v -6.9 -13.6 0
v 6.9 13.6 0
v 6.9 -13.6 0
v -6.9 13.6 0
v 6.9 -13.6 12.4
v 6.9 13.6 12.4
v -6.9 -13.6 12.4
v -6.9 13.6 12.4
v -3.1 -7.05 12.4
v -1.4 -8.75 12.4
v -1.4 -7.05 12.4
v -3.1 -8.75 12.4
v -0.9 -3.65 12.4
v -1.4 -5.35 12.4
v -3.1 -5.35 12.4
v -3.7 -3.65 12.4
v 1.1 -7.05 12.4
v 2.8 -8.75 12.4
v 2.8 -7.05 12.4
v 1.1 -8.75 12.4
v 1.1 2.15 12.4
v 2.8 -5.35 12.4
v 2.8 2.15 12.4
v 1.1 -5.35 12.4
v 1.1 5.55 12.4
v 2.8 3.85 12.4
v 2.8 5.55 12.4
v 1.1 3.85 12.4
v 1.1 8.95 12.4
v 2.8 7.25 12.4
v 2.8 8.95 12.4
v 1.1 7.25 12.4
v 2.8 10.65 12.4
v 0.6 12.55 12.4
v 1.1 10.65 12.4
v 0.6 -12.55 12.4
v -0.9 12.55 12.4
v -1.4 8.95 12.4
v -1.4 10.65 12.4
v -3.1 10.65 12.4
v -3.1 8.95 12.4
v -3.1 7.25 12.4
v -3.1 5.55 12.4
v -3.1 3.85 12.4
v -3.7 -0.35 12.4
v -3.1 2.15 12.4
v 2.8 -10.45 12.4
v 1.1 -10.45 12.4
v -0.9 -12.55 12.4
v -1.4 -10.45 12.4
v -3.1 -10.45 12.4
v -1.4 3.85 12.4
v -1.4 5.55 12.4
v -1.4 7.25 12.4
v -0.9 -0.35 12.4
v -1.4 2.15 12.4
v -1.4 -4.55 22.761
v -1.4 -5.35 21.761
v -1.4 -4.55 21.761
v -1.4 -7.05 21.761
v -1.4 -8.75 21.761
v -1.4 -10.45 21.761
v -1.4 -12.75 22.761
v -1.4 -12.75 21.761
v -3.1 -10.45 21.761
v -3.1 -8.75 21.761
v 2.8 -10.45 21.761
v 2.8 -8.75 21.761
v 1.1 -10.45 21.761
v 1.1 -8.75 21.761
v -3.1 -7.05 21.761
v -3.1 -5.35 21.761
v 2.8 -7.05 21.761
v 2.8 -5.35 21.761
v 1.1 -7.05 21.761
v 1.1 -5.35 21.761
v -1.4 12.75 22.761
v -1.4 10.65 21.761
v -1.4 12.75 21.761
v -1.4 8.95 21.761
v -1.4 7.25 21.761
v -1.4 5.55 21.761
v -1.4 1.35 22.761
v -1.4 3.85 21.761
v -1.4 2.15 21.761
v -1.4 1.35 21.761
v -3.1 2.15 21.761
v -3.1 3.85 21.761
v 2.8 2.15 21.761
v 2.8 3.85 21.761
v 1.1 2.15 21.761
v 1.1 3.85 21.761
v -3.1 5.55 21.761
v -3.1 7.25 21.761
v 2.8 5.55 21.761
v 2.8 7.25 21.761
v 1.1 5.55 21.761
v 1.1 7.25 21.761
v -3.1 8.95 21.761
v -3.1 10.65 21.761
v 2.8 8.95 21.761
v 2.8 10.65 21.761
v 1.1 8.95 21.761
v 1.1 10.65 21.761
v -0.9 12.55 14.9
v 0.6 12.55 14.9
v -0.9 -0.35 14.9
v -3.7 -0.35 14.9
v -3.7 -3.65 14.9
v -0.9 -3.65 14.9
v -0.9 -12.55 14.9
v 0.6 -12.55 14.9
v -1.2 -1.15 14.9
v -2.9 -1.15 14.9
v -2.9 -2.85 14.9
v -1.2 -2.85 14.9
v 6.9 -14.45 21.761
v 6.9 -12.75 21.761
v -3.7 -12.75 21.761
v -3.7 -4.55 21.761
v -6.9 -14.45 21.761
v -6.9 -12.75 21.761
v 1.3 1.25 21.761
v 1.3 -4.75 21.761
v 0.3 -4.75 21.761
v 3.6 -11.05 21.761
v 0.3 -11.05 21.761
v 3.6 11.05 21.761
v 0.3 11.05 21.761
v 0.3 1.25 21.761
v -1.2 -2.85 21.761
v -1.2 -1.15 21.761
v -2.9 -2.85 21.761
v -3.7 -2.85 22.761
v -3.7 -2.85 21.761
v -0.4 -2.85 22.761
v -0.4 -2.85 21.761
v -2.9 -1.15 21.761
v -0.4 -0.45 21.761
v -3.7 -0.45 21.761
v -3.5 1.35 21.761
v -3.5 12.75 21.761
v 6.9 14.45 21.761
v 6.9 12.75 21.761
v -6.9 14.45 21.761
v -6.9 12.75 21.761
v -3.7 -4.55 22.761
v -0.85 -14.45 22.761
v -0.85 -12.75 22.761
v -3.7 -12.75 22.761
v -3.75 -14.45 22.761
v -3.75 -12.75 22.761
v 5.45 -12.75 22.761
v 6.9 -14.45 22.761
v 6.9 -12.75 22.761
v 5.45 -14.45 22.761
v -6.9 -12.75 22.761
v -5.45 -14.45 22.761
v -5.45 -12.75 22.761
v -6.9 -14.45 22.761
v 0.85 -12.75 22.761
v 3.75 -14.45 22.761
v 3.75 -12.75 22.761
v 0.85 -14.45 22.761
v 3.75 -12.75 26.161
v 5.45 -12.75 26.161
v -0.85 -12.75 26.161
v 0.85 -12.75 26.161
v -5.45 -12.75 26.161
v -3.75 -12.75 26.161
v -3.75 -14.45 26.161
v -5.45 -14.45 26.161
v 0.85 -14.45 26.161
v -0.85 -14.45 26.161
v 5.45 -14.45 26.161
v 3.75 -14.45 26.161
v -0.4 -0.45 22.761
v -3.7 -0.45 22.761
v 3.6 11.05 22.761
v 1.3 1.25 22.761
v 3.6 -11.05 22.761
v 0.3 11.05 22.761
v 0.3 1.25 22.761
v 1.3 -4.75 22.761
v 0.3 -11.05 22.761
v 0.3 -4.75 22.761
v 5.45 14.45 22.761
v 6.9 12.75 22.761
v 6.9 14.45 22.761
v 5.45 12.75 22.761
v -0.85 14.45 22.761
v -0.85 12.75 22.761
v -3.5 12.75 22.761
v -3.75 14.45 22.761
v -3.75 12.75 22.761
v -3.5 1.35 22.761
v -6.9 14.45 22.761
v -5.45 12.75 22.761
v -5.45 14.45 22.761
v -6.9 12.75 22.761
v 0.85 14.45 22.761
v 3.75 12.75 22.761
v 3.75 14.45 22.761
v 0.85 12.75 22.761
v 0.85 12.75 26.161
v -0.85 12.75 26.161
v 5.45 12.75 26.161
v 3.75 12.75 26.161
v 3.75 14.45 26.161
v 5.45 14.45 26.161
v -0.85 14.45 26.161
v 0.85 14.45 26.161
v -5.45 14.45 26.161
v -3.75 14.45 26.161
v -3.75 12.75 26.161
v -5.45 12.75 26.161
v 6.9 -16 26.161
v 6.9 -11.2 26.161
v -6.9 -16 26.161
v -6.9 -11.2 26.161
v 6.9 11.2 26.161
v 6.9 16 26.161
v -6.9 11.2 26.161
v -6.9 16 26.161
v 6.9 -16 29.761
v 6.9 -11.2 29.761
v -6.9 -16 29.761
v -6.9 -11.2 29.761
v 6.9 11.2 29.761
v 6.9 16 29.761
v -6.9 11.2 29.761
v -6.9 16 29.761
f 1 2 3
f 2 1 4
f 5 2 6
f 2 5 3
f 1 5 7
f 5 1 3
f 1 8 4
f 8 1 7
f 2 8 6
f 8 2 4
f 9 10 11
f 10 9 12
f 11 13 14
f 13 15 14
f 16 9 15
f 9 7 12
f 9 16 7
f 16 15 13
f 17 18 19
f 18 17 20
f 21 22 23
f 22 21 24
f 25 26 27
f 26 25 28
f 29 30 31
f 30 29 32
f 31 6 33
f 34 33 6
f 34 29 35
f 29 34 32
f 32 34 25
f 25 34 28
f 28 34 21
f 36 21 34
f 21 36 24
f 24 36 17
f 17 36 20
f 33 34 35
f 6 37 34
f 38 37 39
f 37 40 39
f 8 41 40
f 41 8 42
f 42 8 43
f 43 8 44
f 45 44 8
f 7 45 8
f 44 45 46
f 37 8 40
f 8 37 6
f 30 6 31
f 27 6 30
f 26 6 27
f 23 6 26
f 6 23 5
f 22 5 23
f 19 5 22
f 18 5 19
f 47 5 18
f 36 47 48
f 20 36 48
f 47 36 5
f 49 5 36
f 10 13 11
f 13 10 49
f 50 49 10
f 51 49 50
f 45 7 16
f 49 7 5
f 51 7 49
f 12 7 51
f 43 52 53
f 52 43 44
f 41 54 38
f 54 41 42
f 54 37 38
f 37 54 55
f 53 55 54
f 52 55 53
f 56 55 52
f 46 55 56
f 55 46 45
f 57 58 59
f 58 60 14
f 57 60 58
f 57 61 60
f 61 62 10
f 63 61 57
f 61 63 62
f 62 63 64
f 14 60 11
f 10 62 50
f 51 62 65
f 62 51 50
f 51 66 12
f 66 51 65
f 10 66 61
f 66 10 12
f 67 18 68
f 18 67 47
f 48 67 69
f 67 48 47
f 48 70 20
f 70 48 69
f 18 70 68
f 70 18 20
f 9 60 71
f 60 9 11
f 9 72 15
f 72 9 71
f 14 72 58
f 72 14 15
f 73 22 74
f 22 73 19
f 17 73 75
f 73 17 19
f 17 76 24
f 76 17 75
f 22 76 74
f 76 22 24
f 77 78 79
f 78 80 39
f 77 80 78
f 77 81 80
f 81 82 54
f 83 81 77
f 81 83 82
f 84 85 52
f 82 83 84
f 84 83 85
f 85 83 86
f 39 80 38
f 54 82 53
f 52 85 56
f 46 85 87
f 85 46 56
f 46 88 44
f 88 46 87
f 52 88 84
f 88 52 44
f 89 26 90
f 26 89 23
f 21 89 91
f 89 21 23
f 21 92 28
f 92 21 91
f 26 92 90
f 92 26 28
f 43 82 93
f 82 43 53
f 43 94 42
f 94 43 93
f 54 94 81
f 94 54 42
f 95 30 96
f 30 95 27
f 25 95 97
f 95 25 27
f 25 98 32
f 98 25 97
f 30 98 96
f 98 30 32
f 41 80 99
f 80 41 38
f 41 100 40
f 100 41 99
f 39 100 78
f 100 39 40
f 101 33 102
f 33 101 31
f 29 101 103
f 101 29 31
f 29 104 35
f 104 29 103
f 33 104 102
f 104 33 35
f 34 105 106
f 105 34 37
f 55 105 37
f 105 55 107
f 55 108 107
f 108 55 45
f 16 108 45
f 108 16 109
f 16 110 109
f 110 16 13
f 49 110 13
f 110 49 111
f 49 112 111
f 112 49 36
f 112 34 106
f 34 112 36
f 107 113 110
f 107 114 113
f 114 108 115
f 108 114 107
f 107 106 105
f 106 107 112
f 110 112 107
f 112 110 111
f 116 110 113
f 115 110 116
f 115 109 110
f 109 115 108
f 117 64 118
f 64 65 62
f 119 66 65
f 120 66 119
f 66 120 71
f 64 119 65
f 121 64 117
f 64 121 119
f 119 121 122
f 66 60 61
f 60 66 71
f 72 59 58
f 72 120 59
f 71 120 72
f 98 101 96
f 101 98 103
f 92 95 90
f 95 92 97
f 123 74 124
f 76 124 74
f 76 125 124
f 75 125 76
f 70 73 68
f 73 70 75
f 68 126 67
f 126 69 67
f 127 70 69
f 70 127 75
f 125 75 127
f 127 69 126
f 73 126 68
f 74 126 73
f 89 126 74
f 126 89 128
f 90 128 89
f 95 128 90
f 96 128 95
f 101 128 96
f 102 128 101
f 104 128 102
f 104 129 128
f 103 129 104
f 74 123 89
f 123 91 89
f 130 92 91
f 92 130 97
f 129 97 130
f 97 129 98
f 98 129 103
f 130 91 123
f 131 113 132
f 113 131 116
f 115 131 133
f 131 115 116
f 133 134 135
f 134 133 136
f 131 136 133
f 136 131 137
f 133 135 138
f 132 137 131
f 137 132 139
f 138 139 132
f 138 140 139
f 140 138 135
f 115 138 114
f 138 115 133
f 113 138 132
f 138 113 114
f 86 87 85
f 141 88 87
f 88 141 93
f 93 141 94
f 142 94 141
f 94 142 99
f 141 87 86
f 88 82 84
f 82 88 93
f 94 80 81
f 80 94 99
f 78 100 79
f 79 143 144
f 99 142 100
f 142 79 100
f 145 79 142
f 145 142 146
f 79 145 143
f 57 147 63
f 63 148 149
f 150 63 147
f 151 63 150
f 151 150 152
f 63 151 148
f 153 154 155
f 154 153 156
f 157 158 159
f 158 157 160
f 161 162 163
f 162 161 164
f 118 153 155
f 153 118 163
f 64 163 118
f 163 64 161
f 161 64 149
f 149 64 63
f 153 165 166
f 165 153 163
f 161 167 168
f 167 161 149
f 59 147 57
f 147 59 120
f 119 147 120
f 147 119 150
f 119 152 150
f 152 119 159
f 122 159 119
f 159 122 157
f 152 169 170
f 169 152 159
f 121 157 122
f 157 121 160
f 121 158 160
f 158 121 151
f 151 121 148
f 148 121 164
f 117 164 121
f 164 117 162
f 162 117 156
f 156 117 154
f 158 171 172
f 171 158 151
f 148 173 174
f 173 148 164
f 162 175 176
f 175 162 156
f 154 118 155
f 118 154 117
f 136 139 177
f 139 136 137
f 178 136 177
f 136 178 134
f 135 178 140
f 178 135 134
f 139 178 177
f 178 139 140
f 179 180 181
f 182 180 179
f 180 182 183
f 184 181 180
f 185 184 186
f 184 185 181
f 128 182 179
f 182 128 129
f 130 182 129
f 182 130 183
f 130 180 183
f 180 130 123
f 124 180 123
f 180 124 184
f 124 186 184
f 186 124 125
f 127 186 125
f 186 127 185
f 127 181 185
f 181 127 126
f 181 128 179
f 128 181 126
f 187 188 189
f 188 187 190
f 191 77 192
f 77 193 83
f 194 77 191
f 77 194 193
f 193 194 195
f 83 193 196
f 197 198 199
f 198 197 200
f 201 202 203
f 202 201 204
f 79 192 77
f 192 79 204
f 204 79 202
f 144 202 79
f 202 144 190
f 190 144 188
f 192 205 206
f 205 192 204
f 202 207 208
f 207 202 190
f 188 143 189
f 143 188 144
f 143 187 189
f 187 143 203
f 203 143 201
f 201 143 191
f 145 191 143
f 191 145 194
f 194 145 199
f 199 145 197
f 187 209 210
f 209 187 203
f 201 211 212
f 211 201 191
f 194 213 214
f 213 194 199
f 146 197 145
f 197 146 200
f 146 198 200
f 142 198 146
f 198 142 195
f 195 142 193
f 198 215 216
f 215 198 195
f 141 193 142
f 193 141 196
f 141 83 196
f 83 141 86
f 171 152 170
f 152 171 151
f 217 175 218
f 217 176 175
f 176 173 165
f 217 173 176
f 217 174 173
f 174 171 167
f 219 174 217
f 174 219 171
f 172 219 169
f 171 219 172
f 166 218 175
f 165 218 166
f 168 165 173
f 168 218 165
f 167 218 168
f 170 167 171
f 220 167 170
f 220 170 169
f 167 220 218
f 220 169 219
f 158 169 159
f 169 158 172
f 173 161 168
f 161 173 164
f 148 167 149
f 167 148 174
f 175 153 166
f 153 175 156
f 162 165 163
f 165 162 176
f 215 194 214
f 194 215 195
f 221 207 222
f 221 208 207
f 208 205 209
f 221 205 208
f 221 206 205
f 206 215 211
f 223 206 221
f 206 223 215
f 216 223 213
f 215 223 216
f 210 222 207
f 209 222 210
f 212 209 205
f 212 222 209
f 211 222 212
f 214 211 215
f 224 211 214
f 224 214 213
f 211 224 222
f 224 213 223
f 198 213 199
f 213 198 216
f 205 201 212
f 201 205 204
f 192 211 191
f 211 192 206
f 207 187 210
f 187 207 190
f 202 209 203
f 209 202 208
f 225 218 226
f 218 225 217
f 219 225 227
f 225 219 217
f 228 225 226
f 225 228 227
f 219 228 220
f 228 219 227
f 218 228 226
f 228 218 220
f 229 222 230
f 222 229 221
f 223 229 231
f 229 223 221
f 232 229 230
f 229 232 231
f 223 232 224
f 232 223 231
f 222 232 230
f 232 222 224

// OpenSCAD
// Generated by SolidPython 0.4.2 on 2020-09-29 23:20:58
//!OpenSCAD

scale(v = 0.0100000000) {
	translate(v = [-690, -1360, 0]) {
		union() {
			color(c = [0.4000000000, 0.4000000000, 0.4000000000]) {
				translate(v = [0, 0, 0]) {
					linear_extrude(height = 1000.0000000000) {
						polygon(paths = [[0, 1, 2, 3]], points = [[0, 0], [0, 2720], [1380, 2720], [1380, 0]]);
					}
				}
			}
			color(c = [0.2000000000, 0.6000000000, 0.2000000000]) {
				translate(v = [0, 0, 1000.0000000000]) {
					linear_extrude(height = 120.0000000000) {
						polygon(paths = [[0, 1, 2, 3]], points = [[0, 1305], [0, 2720], [1380, 2720], [1380, 1305]]);
					}
				}
			}
			color(c = [0.4000000000, 0.4000000000, 0.4000000000]) {
				translate(v = [0, 0, 1000.0000000000]) {
					linear_extrude(height = 120.0000000000) {
						polygon(paths = [[0, 1, 2, 3]], points = [[0, 0], [0, 1305], [1380, 1305], [1380, 0]]);
					}
				}
			}
			color(c = [0.9000000000, 0.6000000000, 0.6000000000]) {
				translate(v = [0, 0, 1120.0000000000]) {
					linear_extrude(height = 120.0000000000) {
						polygon(paths = [[0, 1, 2, 3]], points = [[340, 1485], [340, 2485], [600, 2485], [600, 1485]]);
					}
				}
			}
			color(c = [0.9000000000, 0.6000000000, 0.6000000000]) {
				translate(v = [0, 0, 1120.0000000000]) {
					linear_extrude(height = 120.0000000000) {
						polygon(paths = [[0, 1, 2, 3]], points = [[750, 1485], [750, 2485], [1010, 2485], [1010, 1485]]);
					}
				}
			}
			color(c = [0.9000000000, 0.6000000000, 0.9000000000]) {
				translate(v = [0, 0, 1120.0000000000]) {
					linear_extrude(height = 120.0000000000) {
						polygon(paths = [[0, 1, 2, 3]], points = [[340, 235], [340, 885], [600, 885], [600, 235]]);
					}
				}
			}
			color(c = [0.9000000000, 0.6000000000, 0.9000000000]) {
				translate(v = [0, 0, 1120.0000000000]) {
					linear_extrude(height = 120.0000000000) {
						polygon(paths = [[0, 1, 2, 3]], points = [[750, 235], [750, 885], [1010, 885], [1010, 235]]);
					}
				}
			}
			color(c = [0.2000000000, 0.6000000000, 0.2000000000]) {
				translate(v = [0, 0, 1120.0000000000]) {
					linear_extrude(height = 120.0000000000) {
						difference() {
							polygon(paths = [[0, 1, 2, 3]], points = [[0, 1305], [0, 2720], [1380, 2720], [1380, 1305]]);
							polygon(paths = [[0, 1, 2, 3]], points = [[340, 1485], [600, 1485], [600, 2485], [340, 2485]]);
							polygon(paths = [[0, 1, 2, 3]], points = [[750, 1485], [1010, 1485], [1010, 2485], [750, 2485]]);
						}
					}
				}
			}
			color(c = [0.4000000000, 0.4000000000, 0.4000000000]) {
				translate(v = [0, 0, 1120.0000000000]) {
					linear_extrude(height = 120.0000000000) {
						difference() {
							polygon(paths = [[0, 1, 2, 3]], points = [[0, 0], [0, 1305], [1380, 1305], [1380, 0]]);
							polygon(paths = [[0, 1, 2, 3]], points = [[340, 235], [600, 235], [600, 885], [340, 885]]);
							polygon(paths = [[0, 1, 2, 3]], points = [[750, 235], [1010, 235], [1010, 885], [750, 885]]);
						}
					}
				}
			}
			color(c = [0.1000000000, 0.1000000000, 0.1000000000]) {
				translate(v = [0, 0, 1240.0000000000]) {
					linear_extrude(height = 70.0000000000) {
						polygon(paths = [[0, 1, 2, 3]], points = [[380, 315], [380, 485], [550, 485], [550, 315]]);
					}
				}
			}
			color(c = [0.1000000000, 0.1000000000, 0.1000000000]) {
				translate(v = [0, 0, 1240.0000000000]) {
					linear_extrude(height = 70.0000000000) {
						polygon(paths = [[0, 1, 2, 3]], points = [[800, 315], [800, 485], [970, 485], [970, 315]]);
					}
				}
			}
			color(c = [0.1000000000, 0.1000000000, 0.1000000000]) {
				translate(v = [0, 0, 1240.0000000000]) {
					linear_extrude(height = 70.0000000000) {
						polygon(paths = [[0, 1, 2, 3]], points = [[380, 655], [380, 825], [550, 825], [550, 655]]);
					}
				}
			}
			color(c = [0.1000000000, 0.1000000000, 0.1000000000]) {
				translate(v = [0, 0, 1240.0000000000]) {
					linear_extrude(height = 70.0000000000) {
						polygon(paths = [[0, 1, 2, 3]], points = [[800, 655], [800, 825], [970, 825], [970, 655]]);
					}
				}
			}
			color(c = [0.1000000000, 0.1000000000, 0.1000000000]) {
				translate(v = [0, 0, 1240.0000000000]) {
					linear_extrude(height = 70.0000000000) {
						polygon(paths = [[0, 1, 2, 3]], points = [[380, 1575], [380, 1745], [550, 1745], [550, 1575]]);
					}
				}
			}
			color(c = [0.1000000000, 0.1000000000, 0.1000000000]) {
				translate(v = [0, 0, 1240.0000000000]) {
					linear_extrude(height = 70.0000000000) {
						polygon(paths = [[0, 1, 2, 3]], points = [[800, 1575], [800, 1745], [970, 1745], [970, 1575]]);
					}
				}
			}
			color(c = [0.1000000000, 0.1000000000, 0.1000000000]) {
				translate(v = [0, 0, 1240.0000000000]) {
					linear_extrude(height = 70.0000000000) {
						polygon(paths = [[0, 1, 2, 3]], points = [[380, 1915], [380, 2085], [550, 2085], [550, 1915]]);
					}
				}
			}
			color(c = [0.1000000000, 0.1000000000, 0.1000000000]) {
				translate(v = [0, 0, 1240.0000000000]) {
					linear_extrude(height = 70.0000000000) {
						polygon(paths = [[0, 1, 2, 3]], points = [[800, 1915], [800, 2085], [970, 2085], [970, 1915]]);
					}
				}
			}
			color(c = [0.1000000000, 0.1000000000, 0.1000000000]) {
				translate(v = [0, 0, 1240.0000000000]) {
					linear_extrude(height = 70.0000000000) {
						polygon(paths = [[0, 1, 2, 3]], points = [[380, 2255], [380, 2425], [550, 2425], [550, 2255]]);
					}
				}
			}
			color(c = [0.1000000000, 0.1000000000, 0.1000000000]) {
				translate(v = [0, 0, 1240.0000000000]) {
					linear_extrude(height = 70.0000000000) {
						polygon(paths = [[0, 1, 2, 3]], points = [[800, 2255], [800, 2425], [970, 2425], [970, 2255]]);
					}
				}
			}
			color(c = [1.0000000000, 1.0000000000, 1.0000000000]) {
				translate(v = [0, 0, 1240.0000000000]) {
					linear_extrude(height = 70.0000000000) {
						polygon(paths = [[0, 1, 2, 3, 4, 5, 6, 7]], points = [[600, 105], [600, 995], [320, 995], [320, 1325], [600, 1325], [600, 2615], [750, 2615], [750, 105]]);
					}
				}
			}
			color(c = [0.1000000000, 0.1000000000, 0.1000000000]) {
				translate(v = [0, 0, 1310.0000000000]) {
					linear_extrude(height = 180.0000000000) {
						polygon(paths = [[0, 1, 2, 3]], points = [[380, 315], [380, 485], [550, 485], [550, 315]]);
					}
				}
			}
			color(c = [0.1000000000, 0.1000000000, 0.1000000000]) {
				translate(v = [0, 0, 1310.0000000000]) {
					linear_extrude(height = 180.0000000000) {
						polygon(paths = [[0, 1, 2, 3]], points = [[800, 315], [800, 485], [970, 485], [970, 315]]);
					}
				}
			}
			color(c = [0.1000000000, 0.1000000000, 0.1000000000]) {
				translate(v = [0, 0, 1310.0000000000]) {
					linear_extrude(height = 180.0000000000) {
						polygon(paths = [[0, 1, 2, 3]], points = [[380, 655], [380, 825], [550, 825], [550, 655]]);
					}
				}
			}
			color(c = [0.1000000000, 0.1000000000, 0.1000000000]) {
				translate(v = [0, 0, 1310.0000000000]) {
					linear_extrude(height = 180.0000000000) {
						polygon(paths = [[0, 1, 2, 3]], points = [[800, 655], [800, 825], [970, 825], [970, 655]]);
					}
				}
			}
			color(c = [0.1000000000, 0.1000000000, 0.1000000000]) {
				translate(v = [0, 0, 1310.0000000000]) {
					linear_extrude(height = 180.0000000000) {
						polygon(paths = [[0, 1, 2, 3]], points = [[380, 1575], [380, 1745], [550, 1745], [550, 1575]]);
					}
				}
			}
			color(c = [0.1000000000, 0.1000000000, 0.1000000000]) {
				translate(v = [0, 0, 1310.0000000000]) {
					linear_extrude(height = 180.0000000000) {
						polygon(paths = [[0, 1, 2, 3]], points = [[800, 1575], [800, 1745], [970, 1745], [970, 1575]]);
					}
				}
			}
			color(c = [0.1000000000, 0.1000000000, 0.1000000000]) {
				translate(v = [0, 0, 1310.0000000000]) {
					linear_extrude(height = 180.0000000000) {
						polygon(paths = [[0, 1, 2, 3]], points = [[380, 1915], [380, 2085], [550, 2085], [550, 1915]]);
					}
				}
			}
			color(c = [0.1000000000, 0.1000000000, 0.1000000000]) {
				translate(v = [0, 0, 1310.0000000000]) {
					linear_extrude(height = 180.0000000000) {
						polygon(paths = [[0, 1, 2, 3]], points = [[800, 1915], [800, 2085], [970, 2085], [970, 1915]]);
					}
				}
			}
			color(c = [0.1000000000, 0.1000000000, 0.1000000000]) {
				translate(v = [0, 0, 1310.0000000000]) {
					linear_extrude(height = 180.0000000000) {
						polygon(paths = [[0, 1, 2, 3]], points = [[380, 2255], [380, 2425], [550, 2425], [550, 2255]]);
					}
				}
			}
			color(c = [0.1000000000, 0.1000000000, 0.1000000000]) {
				translate(v = [0, 0, 1310.0000000000]) {
					linear_extrude(height = 180.0000000000) {
						polygon(paths = [[0, 1, 2, 3]], points = [[800, 2255], [800, 2425], [970, 2425], [970, 2255]]);
					}
				}
			}
			color(c = [0.7000000000, 0, 0]) {
				translate(v = [0, 0, 1310.0000000000]) {
					linear_extrude(height = 180.0000000000) {
						polygon(paths = [[0, 1, 2, 3, 4, 5, 6, 7]], points = [[600, 105], [600, 995], [320, 995], [320, 1325], [600, 1325], [600, 2615], [750, 2615], [750, 105]]);
					}
				}
			}
			color(c = [0.1000000000, 0.1000000000, 0.1000000000]) {
				translate(v = [0, 0, 1490.0000000000]) {
					linear_extrude(height = 686.1000000000) {
						polygon(paths = [[0, 1, 2, 3]], points = [[380, 315], [380, 485], [550, 485], [550, 315]]);
					}
				}
			}
			color(c = [0.1000000000, 0.1000000000, 0.1000000000]) {
				translate(v = [0, 0, 1490.0000000000]) {
					linear_extrude(height = 686.1000000000) {
						polygon(paths = [[0, 1, 2, 3]], points = [[800, 315], [800, 485], [970, 485], [970, 315]]);
					}
				}
			}
			color(c = [0.1000000000, 0.1000000000, 0.1000000000]) {
				translate(v = [0, 0, 1490.0000000000]) {
					linear_extrude(height = 686.1000000000) {
						polygon(paths = [[0, 1, 2, 3]], points = [[380, 655], [380, 825], [550, 825], [550, 655]]);
					}
				}
			}
			color(c = [0.1000000000, 0.1000000000, 0.1000000000]) {
				translate(v = [0, 0, 1490.0000000000]) {
					linear_extrude(height = 686.1000000000) {
						polygon(paths = [[0, 1, 2, 3]], points = [[800, 655], [800, 825], [970, 825], [970, 655]]);
					}
				}
			}
			color(c = [0.1000000000, 0.1000000000, 0.1000000000]) {
				translate(v = [0, 0, 1490.0000000000]) {
					linear_extrude(height = 686.1000000000) {
						polygon(paths = [[0, 1, 2, 3]], points = [[400, 1075], [400, 1245], [570, 1245], [570, 1075]]);
					}
				}
			}
			color(c = [0.1000000000, 0.1000000000, 0.1000000000]) {
				translate(v = [0, 0, 1490.0000000000]) {
					linear_extrude(height = 686.1000000000) {
						polygon(paths = [[0, 1, 2, 3]], points = [[380, 1575], [380, 1745], [550, 1745], [550, 1575]]);
					}
				}
			}
			color(c = [0.1000000000, 0.1000000000, 0.1000000000]) {
				translate(v = [0, 0, 1490.0000000000]) {
					linear_extrude(height = 686.1000000000) {
						polygon(paths = [[0, 1, 2, 3]], points = [[800, 1575], [800, 1745], [970, 1745], [970, 1575]]);
					}
				}
			}
			color(c = [0.1000000000, 0.1000000000, 0.1000000000]) {
				translate(v = [0, 0, 1490.0000000000]) {
					linear_extrude(height = 686.1000000000) {
						polygon(paths = [[0, 1, 2, 3]], points = [[380, 1915], [380, 2085], [550, 2085], [550, 1915]]);
					}
				}
			}
			color(c = [0.1000000000, 0.1000000000, 0.1000000000]) {
				translate(v = [0, 0, 1490.0000000000]) {
					linear_extrude(height = 686.1000000000) {
						polygon(paths = [[0, 1, 2, 3]], points = [[800, 1915], [800, 2085], [970, 2085], [970, 1915]]);
					}
				}
			}
			color(c = [0.1000000000, 0.1000000000, 0.1000000000]) {
				translate(v = [0, 0, 1490.0000000000]) {
					linear_extrude(height = 686.1000000000) {
						polygon(paths = [[0, 1, 2, 3]], points = [[380, 2255], [380, 2425], [550, 2425], [550, 2255]]);
					}
				}
			}
			color(c = [0.1000000000, 0.1000000000, 0.1000000000]) {
				translate(v = [0, 0, 1490.0000000000]) {
					linear_extrude(height = 686.1000000000) {
						polygon(paths = [[0, 1, 2, 3]], points = [[800, 2255], [800, 2425], [970, 2425], [970, 2255]]);
					}
				}
			}
			color(c = [0.9000000000, 0.6000000000, 0.6000000000]) {
				translate(v = [0, 0, 2176.1000000000]) {
					linear_extrude(height = 100.0000000000) {
						polygon(paths = [[0, 1, 2, 3, 4, 5, 6, 7]], points = [[0, -85], [0, 85], [320, 85], [320, 905], [550, 905], [550, 85], [1380, 85], [1380, -85]]);
					}
				}
			}
			color(c = [0.9000000000, 0.6000000000, 0.6000000000]) {
				translate(v = [0, 0, 2176.1000000000]) {
					linear_extrude(height = 100.0000000000) {
						polygon(paths = [[0, 1, 2, 3]], points = [[320, 1075], [320, 1315], [650, 1315], [650, 1075]]);
					}
				}
			}
			color(c = [0.9000000000, 0.6000000000, 0.6000000000]) {
				translate(v = [0, 0, 2176.1000000000]) {
					linear_extrude(height = 100.0000000000) {
						polygon(paths = [[0, 1, 2, 3, 4, 5, 6, 7]], points = [[720, 255], [720, 885], [820, 885], [820, 1485], [720, 1485], [720, 2465], [1050, 2465], [1050, 255]]);
					}
				}
			}
			color(c = [0.9000000000, 0.6000000000, 0.6000000000]) {
				translate(v = [0, 0, 2176.1000000000]) {
					linear_extrude(height = 100.0000000000) {
						polygon(paths = [[0, 1, 2, 3, 4, 5, 6, 7]], points = [[340, 1495], [340, 2635], [0, 2635], [0, 2805], [1380, 2805], [1380, 2635], [550, 2635], [550, 1495]]);
					}
				}
			}
			color(c = [0.5000000000, 0.5000000000, 0.5000000000]) {
				translate(v = [0, 0, 2276.1000000000]) {
					linear_extrude(height = 340.0000000000) {
						polygon(paths = [[0, 1, 2, 3]], points = [[145, -85], [145, 85], [315, 85], [315, -85]]);
					}
				}
			}
			color(c = [0.5000000000, 0.5000000000, 0.5000000000]) {
				translate(v = [0, 0, 2276.1000000000]) {
					linear_extrude(height = 340.0000000000) {
						polygon(paths = [[0, 1, 2, 3]], points = [[605, -85], [605, 85], [775, 85], [775, -85]]);
					}
				}
			}
			color(c = [0.5000000000, 0.5000000000, 0.5000000000]) {
				translate(v = [0, 0, 2276.1000000000]) {
					linear_extrude(height = 340.0000000000) {
						polygon(paths = [[0, 1, 2, 3]], points = [[1065, -85], [1065, 85], [1235, 85], [1235, -85]]);
					}
				}
			}
			color(c = [0.5000000000, 0.5000000000, 0.5000000000]) {
				translate(v = [0, 0, 2276.1000000000]) {
					linear_extrude(height = 340.0000000000) {
						polygon(paths = [[0, 1, 2, 3]], points = [[145, 2635], [145, 2805], [315, 2805], [315, 2635]]);
					}
				}
			}
			color(c = [0.5000000000, 0.5000000000, 0.5000000000]) {
				translate(v = [0, 0, 2276.1000000000]) {
					linear_extrude(height = 340.0000000000) {
						polygon(paths = [[0, 1, 2, 3]], points = [[605, 2635], [605, 2805], [775, 2805], [775, 2635]]);
					}
				}
			}
			color(c = [0.5000000000, 0.5000000000, 0.5000000000]) {
				translate(v = [0, 0, 2276.1000000000]) {
					linear_extrude(height = 340.0000000000) {
						polygon(paths = [[0, 1, 2, 3]], points = [[1065, 2635], [1065, 2805], [1235, 2805], [1235, 2635]]);
					}
				}
			}
			color(c = [0.3000000000, 0.3000000000, 1]) {
				translate(v = [0, 0, 2616.1000000000]) {
					linear_extrude(height = 360.0000000000) {
						polygon(paths = [[0, 1, 2, 3]], points = [[0, -240], [0, 240], [1380, 240], [1380, -240]]);
					}
				}
			}
			color(c = [0.3000000000, 0.3000000000, 1]) {
				translate(v = [0, 0, 2616.1000000000]) {
					linear_extrude(height = 360.0000000000) {
						polygon(paths = [[0, 1, 2, 3]], points = [[0, 2480], [0, 2960], [1380, 2960], [1380, 2480]]);
					}
				}
			}
		}
	}
}
